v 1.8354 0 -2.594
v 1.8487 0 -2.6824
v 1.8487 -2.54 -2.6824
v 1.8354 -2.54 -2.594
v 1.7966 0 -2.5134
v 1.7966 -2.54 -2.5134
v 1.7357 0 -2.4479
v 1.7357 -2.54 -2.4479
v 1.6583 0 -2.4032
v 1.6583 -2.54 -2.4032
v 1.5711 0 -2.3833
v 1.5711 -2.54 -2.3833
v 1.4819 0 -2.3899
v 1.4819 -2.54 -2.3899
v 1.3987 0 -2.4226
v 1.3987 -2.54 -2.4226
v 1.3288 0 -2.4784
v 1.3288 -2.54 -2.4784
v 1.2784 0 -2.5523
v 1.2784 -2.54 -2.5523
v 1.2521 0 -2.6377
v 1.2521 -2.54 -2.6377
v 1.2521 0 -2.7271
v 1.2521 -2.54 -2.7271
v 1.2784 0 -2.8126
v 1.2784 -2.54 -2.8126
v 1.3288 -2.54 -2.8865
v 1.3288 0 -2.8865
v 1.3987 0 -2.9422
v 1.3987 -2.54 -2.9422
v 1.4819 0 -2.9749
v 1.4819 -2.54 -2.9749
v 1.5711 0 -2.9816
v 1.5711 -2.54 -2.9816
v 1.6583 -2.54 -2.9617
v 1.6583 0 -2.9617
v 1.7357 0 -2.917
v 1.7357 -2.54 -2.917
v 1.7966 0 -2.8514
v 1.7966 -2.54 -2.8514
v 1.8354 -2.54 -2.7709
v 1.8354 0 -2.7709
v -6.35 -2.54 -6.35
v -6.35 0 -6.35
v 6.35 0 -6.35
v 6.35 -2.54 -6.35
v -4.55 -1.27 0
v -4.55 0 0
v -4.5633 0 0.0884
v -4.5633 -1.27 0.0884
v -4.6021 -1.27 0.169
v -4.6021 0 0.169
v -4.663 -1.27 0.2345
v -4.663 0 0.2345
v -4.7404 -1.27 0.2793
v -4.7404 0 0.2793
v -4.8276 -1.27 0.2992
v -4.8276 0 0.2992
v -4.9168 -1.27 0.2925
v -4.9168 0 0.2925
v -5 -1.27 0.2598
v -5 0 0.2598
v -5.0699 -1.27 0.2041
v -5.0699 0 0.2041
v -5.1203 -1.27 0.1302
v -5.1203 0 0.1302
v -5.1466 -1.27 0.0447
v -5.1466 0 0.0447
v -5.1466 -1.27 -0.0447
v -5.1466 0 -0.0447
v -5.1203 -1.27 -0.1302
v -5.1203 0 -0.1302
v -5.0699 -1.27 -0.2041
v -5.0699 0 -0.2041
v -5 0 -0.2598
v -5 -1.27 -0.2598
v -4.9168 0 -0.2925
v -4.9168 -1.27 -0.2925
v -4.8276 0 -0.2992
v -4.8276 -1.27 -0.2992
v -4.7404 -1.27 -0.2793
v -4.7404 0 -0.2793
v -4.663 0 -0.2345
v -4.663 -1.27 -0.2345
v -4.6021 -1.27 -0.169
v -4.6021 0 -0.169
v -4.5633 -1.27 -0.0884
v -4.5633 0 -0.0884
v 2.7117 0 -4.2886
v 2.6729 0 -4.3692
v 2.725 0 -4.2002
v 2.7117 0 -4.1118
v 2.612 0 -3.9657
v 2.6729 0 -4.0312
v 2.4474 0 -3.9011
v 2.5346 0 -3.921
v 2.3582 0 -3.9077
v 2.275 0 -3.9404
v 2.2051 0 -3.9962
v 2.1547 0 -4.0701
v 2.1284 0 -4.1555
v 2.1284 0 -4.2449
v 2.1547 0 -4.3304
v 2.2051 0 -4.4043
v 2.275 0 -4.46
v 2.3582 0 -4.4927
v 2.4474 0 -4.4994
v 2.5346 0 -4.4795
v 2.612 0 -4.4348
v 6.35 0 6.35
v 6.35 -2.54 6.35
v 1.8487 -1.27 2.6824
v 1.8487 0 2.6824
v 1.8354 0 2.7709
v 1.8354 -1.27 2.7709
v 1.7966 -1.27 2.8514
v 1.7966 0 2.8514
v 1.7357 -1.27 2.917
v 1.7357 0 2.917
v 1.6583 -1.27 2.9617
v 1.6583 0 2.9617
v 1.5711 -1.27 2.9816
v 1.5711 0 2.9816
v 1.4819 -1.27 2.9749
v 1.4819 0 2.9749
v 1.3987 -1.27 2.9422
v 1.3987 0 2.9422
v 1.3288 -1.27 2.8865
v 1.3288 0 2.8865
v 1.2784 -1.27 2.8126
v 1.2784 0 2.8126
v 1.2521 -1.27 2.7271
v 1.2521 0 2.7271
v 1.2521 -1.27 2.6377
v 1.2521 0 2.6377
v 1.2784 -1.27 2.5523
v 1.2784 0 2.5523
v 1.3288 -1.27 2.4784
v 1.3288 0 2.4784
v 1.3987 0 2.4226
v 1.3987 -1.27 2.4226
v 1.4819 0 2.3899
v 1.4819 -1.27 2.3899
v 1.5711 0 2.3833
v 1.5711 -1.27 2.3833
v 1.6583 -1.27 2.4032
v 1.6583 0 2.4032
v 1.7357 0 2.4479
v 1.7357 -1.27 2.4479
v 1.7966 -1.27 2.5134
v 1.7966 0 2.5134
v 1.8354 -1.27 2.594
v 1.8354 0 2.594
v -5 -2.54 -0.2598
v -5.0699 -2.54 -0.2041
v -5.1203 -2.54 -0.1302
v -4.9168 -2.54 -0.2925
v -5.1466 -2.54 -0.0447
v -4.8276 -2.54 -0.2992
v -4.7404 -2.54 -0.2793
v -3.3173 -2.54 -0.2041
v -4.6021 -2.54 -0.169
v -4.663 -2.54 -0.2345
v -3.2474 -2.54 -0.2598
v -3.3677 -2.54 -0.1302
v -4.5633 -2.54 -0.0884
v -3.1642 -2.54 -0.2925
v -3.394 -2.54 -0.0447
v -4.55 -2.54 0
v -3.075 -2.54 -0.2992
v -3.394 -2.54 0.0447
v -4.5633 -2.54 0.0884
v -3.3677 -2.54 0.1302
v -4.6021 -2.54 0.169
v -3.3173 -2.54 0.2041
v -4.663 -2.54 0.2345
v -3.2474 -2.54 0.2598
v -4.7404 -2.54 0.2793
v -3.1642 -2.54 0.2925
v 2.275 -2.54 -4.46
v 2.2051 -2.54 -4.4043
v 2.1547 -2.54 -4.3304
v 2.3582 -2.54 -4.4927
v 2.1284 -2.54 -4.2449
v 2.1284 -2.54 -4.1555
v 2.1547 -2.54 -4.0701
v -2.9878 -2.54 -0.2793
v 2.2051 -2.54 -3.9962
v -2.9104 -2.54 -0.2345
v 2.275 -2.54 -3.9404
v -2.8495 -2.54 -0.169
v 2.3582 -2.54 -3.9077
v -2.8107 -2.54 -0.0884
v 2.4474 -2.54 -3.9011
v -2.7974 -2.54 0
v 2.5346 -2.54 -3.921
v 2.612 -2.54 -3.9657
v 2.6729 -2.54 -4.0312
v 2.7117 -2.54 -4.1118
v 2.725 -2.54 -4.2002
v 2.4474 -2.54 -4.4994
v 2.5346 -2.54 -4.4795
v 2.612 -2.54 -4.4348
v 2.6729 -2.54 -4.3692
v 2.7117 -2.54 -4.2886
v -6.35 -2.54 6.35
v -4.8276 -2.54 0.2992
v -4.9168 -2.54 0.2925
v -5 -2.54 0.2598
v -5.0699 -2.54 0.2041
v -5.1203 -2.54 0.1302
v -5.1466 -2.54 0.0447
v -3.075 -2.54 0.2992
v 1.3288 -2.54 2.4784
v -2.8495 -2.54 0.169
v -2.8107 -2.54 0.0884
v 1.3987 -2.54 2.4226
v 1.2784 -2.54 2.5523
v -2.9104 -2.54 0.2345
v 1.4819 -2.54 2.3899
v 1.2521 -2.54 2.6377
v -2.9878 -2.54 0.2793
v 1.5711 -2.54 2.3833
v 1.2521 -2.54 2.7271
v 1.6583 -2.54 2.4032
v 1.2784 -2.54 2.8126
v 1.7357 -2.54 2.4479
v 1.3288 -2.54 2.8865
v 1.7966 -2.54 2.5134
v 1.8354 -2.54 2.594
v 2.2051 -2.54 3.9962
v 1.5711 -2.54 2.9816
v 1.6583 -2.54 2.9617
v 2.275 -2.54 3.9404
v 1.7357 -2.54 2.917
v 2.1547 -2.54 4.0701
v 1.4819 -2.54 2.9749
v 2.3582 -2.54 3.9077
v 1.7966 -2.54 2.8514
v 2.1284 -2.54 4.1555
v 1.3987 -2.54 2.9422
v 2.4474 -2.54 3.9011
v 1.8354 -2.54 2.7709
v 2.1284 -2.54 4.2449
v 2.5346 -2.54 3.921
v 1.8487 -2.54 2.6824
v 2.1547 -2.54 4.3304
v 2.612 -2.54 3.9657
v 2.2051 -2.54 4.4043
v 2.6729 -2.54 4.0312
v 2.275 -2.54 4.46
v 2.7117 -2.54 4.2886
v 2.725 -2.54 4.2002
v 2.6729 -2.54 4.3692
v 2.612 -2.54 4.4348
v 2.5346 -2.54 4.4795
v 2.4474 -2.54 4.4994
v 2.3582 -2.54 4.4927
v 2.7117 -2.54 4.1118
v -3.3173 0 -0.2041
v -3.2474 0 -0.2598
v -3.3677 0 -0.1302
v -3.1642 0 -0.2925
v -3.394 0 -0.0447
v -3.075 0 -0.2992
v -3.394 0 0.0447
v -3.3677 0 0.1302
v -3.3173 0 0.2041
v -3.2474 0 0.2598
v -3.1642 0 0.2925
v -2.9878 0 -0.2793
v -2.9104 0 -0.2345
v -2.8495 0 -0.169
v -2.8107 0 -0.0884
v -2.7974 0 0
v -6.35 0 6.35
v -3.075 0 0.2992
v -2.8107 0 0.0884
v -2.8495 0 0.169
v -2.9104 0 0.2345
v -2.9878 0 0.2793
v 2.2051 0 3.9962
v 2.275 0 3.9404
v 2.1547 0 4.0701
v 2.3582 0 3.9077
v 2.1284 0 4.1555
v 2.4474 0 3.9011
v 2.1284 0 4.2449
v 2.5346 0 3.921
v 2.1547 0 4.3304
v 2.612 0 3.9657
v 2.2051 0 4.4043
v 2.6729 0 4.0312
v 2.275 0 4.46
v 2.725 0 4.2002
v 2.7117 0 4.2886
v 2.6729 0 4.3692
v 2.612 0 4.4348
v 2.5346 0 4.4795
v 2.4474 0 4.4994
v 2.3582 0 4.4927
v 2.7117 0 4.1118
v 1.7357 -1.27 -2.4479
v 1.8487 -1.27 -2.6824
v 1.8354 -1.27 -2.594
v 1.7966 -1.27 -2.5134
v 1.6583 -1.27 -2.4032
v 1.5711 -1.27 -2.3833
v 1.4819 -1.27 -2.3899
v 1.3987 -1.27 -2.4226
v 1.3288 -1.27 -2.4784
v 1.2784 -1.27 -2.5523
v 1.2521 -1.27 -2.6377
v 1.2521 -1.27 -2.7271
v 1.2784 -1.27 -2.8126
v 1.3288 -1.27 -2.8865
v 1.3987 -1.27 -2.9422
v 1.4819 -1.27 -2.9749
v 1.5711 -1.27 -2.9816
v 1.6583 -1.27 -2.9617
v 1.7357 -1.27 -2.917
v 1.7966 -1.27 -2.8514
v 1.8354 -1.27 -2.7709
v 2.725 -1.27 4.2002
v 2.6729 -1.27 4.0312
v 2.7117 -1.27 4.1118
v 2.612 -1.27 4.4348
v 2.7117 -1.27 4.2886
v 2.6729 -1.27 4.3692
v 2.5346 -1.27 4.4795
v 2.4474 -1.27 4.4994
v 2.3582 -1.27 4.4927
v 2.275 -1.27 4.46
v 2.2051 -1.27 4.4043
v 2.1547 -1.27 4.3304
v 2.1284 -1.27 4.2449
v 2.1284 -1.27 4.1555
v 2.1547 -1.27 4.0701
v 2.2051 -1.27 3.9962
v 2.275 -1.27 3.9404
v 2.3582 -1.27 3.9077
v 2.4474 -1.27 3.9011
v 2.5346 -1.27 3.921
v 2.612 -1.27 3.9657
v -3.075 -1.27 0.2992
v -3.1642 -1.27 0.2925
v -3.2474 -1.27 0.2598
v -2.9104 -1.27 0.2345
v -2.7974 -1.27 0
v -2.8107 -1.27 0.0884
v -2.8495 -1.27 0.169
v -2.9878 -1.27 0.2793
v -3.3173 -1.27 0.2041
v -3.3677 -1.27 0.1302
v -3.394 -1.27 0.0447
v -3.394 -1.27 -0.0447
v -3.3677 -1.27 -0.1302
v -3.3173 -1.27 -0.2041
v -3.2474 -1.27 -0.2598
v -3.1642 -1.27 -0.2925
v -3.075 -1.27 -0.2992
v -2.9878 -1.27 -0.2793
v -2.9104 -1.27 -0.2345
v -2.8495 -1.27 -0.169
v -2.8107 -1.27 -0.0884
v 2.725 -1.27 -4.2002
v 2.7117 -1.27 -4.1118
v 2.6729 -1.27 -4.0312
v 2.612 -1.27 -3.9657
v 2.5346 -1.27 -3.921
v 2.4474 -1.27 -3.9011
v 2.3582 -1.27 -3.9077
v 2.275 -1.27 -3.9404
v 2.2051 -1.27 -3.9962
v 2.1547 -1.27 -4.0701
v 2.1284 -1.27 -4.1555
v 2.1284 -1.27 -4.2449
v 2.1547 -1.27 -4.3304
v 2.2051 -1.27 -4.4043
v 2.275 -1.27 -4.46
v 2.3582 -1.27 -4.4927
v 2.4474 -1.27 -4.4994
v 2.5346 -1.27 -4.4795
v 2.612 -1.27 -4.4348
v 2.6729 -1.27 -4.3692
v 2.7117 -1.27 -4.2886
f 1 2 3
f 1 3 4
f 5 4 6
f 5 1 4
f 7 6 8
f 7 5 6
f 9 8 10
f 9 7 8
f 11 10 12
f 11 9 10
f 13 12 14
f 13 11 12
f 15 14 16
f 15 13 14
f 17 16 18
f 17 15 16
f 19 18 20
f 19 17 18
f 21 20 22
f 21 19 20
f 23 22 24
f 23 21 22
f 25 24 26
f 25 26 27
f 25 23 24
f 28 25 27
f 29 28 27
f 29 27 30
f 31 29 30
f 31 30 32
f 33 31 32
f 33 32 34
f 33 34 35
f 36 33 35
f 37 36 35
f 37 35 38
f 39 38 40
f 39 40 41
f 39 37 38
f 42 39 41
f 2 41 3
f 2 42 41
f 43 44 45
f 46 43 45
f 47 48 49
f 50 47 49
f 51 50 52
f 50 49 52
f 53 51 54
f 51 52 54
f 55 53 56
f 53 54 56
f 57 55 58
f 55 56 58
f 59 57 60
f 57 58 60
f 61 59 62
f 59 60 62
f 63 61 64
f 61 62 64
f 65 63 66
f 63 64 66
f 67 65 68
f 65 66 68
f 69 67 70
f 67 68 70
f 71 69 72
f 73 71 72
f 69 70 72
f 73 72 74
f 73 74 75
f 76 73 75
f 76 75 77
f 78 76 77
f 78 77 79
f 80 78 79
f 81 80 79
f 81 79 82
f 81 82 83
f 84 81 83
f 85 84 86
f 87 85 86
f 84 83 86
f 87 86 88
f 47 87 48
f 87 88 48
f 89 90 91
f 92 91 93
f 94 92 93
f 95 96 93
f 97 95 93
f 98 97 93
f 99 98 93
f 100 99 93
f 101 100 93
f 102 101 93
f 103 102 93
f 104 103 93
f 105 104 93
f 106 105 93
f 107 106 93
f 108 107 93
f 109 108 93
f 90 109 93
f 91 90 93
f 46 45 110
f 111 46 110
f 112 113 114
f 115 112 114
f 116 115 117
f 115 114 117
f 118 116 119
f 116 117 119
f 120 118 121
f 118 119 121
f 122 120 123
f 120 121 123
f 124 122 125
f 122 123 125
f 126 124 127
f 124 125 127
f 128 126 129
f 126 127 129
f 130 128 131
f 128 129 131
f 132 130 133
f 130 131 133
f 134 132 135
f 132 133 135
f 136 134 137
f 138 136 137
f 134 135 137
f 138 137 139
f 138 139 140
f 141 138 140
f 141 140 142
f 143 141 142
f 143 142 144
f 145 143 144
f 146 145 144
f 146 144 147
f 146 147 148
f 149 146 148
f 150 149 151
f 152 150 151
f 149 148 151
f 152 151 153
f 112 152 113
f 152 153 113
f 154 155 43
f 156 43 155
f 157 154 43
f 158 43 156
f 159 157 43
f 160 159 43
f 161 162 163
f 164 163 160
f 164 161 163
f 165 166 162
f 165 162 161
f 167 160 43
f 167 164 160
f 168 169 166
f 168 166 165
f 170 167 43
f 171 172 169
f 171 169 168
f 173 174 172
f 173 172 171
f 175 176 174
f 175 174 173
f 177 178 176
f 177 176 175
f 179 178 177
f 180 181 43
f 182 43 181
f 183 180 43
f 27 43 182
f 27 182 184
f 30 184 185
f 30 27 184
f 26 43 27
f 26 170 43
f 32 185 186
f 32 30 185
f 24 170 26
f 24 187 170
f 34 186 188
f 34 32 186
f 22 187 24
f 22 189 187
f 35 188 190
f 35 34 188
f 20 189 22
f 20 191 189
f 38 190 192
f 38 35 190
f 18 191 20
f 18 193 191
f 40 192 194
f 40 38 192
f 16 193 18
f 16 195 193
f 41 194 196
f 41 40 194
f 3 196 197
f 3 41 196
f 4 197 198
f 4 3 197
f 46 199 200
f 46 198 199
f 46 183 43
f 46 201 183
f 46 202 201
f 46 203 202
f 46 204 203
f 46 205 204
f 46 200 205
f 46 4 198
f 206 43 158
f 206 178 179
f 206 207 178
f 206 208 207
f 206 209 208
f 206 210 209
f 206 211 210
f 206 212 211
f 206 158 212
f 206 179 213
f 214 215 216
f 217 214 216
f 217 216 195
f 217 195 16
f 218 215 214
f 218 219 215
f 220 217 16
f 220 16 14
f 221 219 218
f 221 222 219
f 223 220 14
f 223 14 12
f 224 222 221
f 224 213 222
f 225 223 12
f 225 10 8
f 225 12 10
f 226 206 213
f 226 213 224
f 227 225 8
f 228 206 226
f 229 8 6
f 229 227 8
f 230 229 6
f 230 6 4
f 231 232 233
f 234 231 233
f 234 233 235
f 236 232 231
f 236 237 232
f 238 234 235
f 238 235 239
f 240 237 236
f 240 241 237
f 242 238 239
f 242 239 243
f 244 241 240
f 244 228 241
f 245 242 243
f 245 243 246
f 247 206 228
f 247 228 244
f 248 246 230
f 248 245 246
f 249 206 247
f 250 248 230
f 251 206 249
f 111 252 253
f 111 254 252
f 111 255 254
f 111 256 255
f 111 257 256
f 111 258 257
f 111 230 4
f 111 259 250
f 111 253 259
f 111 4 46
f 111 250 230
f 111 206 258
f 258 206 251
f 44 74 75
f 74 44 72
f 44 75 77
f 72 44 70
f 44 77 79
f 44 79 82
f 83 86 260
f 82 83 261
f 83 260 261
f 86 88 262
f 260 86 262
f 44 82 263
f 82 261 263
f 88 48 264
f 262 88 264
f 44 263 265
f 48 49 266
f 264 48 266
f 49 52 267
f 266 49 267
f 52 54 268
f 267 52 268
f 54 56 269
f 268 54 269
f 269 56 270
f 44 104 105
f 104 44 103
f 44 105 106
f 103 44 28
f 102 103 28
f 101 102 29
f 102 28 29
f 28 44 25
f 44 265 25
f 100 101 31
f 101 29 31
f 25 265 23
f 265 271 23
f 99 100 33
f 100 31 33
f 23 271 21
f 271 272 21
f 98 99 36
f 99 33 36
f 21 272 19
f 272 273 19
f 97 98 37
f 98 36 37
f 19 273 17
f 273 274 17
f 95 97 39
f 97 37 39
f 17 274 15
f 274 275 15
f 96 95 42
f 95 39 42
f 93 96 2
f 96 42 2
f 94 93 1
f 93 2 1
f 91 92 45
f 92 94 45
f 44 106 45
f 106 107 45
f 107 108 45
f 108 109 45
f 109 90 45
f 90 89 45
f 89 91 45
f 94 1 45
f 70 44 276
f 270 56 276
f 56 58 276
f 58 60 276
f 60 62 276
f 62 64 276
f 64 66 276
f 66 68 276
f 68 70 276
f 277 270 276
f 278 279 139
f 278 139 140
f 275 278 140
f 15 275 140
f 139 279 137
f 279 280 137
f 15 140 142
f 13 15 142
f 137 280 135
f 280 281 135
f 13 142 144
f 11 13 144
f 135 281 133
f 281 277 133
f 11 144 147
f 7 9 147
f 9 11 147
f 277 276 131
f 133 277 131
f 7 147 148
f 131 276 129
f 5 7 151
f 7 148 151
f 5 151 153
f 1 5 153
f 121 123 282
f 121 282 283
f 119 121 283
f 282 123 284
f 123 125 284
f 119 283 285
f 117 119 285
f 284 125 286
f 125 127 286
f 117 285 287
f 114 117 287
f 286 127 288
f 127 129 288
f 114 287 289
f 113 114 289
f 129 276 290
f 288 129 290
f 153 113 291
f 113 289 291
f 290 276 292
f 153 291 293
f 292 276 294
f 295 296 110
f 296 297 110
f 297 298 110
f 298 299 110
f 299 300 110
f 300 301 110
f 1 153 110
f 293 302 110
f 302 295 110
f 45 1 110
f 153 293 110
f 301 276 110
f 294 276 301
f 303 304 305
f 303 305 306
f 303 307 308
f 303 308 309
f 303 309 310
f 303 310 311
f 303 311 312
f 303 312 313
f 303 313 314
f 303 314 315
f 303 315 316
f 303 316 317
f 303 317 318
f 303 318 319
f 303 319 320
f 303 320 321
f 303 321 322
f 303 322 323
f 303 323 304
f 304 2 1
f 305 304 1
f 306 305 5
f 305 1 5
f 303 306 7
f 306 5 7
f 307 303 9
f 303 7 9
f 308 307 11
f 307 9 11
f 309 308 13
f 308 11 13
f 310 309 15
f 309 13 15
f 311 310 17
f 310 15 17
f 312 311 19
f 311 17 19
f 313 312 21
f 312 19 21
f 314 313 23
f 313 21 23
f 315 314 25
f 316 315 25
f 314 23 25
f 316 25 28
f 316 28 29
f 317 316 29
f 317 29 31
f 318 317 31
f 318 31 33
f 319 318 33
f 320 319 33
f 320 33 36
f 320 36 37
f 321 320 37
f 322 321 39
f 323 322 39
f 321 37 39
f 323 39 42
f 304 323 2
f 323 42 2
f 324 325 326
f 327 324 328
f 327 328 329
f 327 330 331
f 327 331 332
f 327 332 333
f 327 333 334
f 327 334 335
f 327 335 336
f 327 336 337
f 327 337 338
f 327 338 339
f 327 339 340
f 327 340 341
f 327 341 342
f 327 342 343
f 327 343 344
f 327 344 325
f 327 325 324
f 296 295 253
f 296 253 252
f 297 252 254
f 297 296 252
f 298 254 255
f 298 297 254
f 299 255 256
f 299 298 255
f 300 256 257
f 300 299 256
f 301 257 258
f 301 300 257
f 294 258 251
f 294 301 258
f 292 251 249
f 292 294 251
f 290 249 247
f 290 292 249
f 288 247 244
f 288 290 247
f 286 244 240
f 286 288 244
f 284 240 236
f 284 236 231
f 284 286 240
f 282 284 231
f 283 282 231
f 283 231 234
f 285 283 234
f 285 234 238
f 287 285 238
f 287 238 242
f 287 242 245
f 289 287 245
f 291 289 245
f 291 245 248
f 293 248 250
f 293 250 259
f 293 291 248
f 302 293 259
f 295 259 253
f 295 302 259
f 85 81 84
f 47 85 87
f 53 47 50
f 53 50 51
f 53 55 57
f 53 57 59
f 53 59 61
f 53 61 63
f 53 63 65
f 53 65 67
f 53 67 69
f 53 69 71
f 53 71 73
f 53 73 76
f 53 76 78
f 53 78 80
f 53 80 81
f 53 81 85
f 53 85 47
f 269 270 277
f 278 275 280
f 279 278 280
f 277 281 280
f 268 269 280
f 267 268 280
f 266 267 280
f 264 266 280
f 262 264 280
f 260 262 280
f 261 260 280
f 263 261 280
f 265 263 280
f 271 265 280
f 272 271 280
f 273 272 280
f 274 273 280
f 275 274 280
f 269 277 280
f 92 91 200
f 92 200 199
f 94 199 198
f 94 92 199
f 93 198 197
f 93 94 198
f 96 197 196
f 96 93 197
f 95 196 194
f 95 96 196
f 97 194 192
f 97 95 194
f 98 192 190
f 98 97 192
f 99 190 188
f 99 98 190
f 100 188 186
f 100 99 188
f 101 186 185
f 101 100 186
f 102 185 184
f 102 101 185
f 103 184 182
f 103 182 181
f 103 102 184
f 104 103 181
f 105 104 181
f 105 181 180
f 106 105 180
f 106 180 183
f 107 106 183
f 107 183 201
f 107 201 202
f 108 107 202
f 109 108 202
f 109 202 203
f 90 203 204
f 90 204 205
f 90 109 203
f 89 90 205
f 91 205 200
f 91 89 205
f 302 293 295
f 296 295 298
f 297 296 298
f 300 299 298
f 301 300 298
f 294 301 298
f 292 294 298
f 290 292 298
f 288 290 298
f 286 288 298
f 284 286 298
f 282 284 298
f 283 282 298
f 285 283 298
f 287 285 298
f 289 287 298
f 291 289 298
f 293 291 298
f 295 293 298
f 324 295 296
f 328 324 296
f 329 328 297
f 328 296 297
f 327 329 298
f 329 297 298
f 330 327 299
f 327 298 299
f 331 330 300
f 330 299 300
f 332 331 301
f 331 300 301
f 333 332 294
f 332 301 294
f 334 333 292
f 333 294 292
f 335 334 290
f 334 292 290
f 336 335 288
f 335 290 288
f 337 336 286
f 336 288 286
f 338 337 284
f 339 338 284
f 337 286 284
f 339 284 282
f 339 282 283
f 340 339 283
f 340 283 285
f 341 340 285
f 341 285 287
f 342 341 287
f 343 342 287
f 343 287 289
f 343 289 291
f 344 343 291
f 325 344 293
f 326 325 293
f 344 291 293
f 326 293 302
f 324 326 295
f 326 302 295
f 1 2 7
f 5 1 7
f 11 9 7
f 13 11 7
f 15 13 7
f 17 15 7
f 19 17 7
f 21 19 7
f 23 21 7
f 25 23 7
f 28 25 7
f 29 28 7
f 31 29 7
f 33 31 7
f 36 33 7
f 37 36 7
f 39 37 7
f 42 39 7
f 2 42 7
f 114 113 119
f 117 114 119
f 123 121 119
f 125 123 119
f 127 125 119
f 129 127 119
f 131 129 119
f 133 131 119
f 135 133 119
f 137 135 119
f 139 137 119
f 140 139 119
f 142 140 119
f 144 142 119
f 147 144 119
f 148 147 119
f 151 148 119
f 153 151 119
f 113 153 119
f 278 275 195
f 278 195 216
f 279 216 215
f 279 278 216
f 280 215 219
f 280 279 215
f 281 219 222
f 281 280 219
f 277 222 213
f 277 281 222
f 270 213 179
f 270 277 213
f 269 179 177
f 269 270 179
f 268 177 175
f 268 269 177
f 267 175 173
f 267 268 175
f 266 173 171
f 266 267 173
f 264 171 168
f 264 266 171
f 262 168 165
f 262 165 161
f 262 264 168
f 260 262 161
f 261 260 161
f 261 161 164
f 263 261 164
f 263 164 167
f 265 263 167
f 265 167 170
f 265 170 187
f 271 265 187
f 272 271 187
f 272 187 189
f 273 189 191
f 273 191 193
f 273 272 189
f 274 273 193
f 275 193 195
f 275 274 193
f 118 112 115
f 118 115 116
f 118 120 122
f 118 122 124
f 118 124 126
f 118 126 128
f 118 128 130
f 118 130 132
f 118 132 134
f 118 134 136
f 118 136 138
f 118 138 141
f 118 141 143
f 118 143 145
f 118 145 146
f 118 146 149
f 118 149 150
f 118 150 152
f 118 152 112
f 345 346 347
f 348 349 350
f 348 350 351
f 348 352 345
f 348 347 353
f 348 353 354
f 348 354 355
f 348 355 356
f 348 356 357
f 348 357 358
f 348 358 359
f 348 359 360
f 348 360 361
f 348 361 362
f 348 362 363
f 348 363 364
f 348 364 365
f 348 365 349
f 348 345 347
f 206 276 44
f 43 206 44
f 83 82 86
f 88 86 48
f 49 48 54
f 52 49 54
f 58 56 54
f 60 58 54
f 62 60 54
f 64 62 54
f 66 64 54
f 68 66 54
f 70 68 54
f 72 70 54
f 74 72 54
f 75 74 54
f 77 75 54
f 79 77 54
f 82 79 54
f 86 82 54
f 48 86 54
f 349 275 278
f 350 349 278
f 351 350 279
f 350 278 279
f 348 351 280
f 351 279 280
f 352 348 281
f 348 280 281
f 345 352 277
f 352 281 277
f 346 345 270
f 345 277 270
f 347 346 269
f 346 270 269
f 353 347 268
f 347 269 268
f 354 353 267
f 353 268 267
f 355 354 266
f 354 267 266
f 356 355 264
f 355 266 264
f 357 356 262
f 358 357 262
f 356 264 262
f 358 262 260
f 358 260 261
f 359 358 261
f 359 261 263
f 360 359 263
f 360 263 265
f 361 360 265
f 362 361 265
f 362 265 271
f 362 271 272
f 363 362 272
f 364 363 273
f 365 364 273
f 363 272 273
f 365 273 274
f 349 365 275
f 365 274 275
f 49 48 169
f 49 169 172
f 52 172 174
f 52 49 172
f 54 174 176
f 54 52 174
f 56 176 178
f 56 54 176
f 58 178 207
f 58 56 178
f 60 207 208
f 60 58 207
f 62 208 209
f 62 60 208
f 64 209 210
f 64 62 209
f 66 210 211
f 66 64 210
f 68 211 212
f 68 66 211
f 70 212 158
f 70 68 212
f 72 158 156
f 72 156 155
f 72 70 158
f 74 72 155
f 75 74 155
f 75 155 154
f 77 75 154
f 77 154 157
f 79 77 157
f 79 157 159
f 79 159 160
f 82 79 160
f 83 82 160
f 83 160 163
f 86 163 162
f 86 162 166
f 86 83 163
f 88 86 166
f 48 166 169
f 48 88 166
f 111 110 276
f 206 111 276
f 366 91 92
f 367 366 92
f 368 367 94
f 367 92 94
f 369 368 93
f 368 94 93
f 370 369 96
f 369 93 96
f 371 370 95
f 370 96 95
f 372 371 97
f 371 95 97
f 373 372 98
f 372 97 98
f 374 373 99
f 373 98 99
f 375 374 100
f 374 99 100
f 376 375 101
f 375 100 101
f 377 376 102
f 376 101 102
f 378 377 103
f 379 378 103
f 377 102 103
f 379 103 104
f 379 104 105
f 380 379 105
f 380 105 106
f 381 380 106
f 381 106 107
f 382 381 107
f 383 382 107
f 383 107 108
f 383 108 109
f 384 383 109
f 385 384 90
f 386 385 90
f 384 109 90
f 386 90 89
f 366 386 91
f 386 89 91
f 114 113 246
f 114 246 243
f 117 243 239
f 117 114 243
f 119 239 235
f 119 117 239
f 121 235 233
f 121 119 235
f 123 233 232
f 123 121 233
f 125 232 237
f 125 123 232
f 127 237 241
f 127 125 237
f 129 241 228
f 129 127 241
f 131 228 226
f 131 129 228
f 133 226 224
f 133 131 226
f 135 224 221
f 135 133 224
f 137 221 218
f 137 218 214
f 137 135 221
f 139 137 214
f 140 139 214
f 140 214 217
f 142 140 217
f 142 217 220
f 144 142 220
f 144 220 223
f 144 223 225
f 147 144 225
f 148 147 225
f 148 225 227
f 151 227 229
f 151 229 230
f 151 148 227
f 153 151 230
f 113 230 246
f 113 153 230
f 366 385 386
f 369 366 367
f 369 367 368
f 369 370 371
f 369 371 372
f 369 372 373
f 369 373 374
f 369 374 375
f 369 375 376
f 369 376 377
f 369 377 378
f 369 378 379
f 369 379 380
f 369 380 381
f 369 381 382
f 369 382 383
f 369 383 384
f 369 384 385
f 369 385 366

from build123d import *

# Parameters (mm, degrees)
F0_R     = 0.3
F1_DEPTH = 1.27
F2_DEPTH = 2.54


with BuildPart() as f1:
    # F0 (on Front) → F1 (new body)
    with BuildSketch(Plane.XZ):
        with Locations((2.425, 4.2002232084)):
            Circle(F0_R)
    extrude(amount=F1_DEPTH)


with BuildPart() as f1b:
    # F0 (on Front) → F1, piece 2 (new body)
    with BuildSketch(Plane.XZ):
        with Locations((1.5487, 2.6824270857)):
            Circle(F0_R)
    extrude(amount=F1_DEPTH)


with BuildPart() as f1c:
    # F0 (on Front) → F1, piece 3 (new body)
    with BuildSketch(Plane.XZ):
        with Locations((-3.0974, 0)):
            Circle(F0_R)
    extrude(amount=F1_DEPTH)


with BuildPart() as f1d:
    # F0 (on Front) → F1, piece 4 (new body)
    with BuildSketch(Plane.XZ):
        with Locations((-4.85, 0)):
            Circle(F0_R)
    extrude(amount=F1_DEPTH)


with BuildPart() as f1e:
    # F0 (on Front) → F1, piece 5 (new body)
    with BuildSketch(Plane.XZ):
        with Locations((1.5487, -2.6824270857)):
            Circle(F0_R)
    extrude(amount=F1_DEPTH)


with BuildPart() as f1f:
    # F0 (on Front) → F1, piece 6 (new body)
    with BuildSketch(Plane.XZ):
        with Locations((2.425, -4.2002232084)):
            Circle(F0_R)
    extrude(amount=F1_DEPTH)


with BuildPart() as f2:
    # F0 (on Front) → F2 (new body)
    with BuildSketch(Plane.XZ):
        with BuildLine():
            ThreePointArc((0, -6.35), (4.4901280605, -4.4901280605), (6.35, 0))
            ThreePointArc((6.35, 0), (4.4901280605, 4.4901280605), (0, 6.35))
            ThreePointArc((0, 6.35), (-4.4901280605, 4.4901280605), (-6.35, 0))
            ThreePointArc((-6.35, 0), (-4.4901280605, -4.4901280605), (0, -6.35))
        make_face()
        with Locations((-4.85, 0)):
            Circle(F0_R, mode=Mode.SUBTRACT)
        with Locations((-3.0974, 0)):
            Circle(F0_R, mode=Mode.SUBTRACT)
        with Locations((2.425, -4.2002232084)):
            Circle(F0_R, mode=Mode.SUBTRACT)
        with Locations((1.5487, -2.6824270857)):
            Circle(F0_R, mode=Mode.SUBTRACT)
        with Locations((1.5487, 2.6824270857)):
            Circle(F0_R, mode=Mode.SUBTRACT)
        with Locations((2.425, 4.2002232084)):
            Circle(F0_R, mode=Mode.SUBTRACT)
        with BuildLine():
            Line((6.35, -6.35), (6.35, 0))
            ThreePointArc((6.35, 0), (4.4901280605, -4.4901280605), (0, -6.35))
            Line((0, -6.35), (6.35, -6.35))
        make_face()
        with BuildLine():
            ThreePointArc((0, 6.35), (4.4901280605, 4.4901280605), (6.35, 0))
            Line((6.35, 0), (6.35, 6.35))
            Line((6.35, 6.35), (0, 6.35))
        make_face()
        with BuildLine():
            ThreePointArc((-6.35, 0), (-4.4901280605, 4.4901280605), (0, 6.35))
            Line((0, 6.35), (-6.35, 6.35))
            Line((-6.35, 6.35), (-6.35, 0))
        make_face()
        with BuildLine():
            Line((-6.35, -6.35), (0, -6.35))
            ThreePointArc((0, -6.35), (-4.4901280605, -4.4901280605), (-6.35, 0))
            Line((-6.35, 0), (-6.35, -6.35))
        make_face()
    extrude(amount=F2_DEPTH)


solid = Compound([f1.part, f1b.part, f1c.part, f1d.part, f1e.part, f1f.part, f2.part])
